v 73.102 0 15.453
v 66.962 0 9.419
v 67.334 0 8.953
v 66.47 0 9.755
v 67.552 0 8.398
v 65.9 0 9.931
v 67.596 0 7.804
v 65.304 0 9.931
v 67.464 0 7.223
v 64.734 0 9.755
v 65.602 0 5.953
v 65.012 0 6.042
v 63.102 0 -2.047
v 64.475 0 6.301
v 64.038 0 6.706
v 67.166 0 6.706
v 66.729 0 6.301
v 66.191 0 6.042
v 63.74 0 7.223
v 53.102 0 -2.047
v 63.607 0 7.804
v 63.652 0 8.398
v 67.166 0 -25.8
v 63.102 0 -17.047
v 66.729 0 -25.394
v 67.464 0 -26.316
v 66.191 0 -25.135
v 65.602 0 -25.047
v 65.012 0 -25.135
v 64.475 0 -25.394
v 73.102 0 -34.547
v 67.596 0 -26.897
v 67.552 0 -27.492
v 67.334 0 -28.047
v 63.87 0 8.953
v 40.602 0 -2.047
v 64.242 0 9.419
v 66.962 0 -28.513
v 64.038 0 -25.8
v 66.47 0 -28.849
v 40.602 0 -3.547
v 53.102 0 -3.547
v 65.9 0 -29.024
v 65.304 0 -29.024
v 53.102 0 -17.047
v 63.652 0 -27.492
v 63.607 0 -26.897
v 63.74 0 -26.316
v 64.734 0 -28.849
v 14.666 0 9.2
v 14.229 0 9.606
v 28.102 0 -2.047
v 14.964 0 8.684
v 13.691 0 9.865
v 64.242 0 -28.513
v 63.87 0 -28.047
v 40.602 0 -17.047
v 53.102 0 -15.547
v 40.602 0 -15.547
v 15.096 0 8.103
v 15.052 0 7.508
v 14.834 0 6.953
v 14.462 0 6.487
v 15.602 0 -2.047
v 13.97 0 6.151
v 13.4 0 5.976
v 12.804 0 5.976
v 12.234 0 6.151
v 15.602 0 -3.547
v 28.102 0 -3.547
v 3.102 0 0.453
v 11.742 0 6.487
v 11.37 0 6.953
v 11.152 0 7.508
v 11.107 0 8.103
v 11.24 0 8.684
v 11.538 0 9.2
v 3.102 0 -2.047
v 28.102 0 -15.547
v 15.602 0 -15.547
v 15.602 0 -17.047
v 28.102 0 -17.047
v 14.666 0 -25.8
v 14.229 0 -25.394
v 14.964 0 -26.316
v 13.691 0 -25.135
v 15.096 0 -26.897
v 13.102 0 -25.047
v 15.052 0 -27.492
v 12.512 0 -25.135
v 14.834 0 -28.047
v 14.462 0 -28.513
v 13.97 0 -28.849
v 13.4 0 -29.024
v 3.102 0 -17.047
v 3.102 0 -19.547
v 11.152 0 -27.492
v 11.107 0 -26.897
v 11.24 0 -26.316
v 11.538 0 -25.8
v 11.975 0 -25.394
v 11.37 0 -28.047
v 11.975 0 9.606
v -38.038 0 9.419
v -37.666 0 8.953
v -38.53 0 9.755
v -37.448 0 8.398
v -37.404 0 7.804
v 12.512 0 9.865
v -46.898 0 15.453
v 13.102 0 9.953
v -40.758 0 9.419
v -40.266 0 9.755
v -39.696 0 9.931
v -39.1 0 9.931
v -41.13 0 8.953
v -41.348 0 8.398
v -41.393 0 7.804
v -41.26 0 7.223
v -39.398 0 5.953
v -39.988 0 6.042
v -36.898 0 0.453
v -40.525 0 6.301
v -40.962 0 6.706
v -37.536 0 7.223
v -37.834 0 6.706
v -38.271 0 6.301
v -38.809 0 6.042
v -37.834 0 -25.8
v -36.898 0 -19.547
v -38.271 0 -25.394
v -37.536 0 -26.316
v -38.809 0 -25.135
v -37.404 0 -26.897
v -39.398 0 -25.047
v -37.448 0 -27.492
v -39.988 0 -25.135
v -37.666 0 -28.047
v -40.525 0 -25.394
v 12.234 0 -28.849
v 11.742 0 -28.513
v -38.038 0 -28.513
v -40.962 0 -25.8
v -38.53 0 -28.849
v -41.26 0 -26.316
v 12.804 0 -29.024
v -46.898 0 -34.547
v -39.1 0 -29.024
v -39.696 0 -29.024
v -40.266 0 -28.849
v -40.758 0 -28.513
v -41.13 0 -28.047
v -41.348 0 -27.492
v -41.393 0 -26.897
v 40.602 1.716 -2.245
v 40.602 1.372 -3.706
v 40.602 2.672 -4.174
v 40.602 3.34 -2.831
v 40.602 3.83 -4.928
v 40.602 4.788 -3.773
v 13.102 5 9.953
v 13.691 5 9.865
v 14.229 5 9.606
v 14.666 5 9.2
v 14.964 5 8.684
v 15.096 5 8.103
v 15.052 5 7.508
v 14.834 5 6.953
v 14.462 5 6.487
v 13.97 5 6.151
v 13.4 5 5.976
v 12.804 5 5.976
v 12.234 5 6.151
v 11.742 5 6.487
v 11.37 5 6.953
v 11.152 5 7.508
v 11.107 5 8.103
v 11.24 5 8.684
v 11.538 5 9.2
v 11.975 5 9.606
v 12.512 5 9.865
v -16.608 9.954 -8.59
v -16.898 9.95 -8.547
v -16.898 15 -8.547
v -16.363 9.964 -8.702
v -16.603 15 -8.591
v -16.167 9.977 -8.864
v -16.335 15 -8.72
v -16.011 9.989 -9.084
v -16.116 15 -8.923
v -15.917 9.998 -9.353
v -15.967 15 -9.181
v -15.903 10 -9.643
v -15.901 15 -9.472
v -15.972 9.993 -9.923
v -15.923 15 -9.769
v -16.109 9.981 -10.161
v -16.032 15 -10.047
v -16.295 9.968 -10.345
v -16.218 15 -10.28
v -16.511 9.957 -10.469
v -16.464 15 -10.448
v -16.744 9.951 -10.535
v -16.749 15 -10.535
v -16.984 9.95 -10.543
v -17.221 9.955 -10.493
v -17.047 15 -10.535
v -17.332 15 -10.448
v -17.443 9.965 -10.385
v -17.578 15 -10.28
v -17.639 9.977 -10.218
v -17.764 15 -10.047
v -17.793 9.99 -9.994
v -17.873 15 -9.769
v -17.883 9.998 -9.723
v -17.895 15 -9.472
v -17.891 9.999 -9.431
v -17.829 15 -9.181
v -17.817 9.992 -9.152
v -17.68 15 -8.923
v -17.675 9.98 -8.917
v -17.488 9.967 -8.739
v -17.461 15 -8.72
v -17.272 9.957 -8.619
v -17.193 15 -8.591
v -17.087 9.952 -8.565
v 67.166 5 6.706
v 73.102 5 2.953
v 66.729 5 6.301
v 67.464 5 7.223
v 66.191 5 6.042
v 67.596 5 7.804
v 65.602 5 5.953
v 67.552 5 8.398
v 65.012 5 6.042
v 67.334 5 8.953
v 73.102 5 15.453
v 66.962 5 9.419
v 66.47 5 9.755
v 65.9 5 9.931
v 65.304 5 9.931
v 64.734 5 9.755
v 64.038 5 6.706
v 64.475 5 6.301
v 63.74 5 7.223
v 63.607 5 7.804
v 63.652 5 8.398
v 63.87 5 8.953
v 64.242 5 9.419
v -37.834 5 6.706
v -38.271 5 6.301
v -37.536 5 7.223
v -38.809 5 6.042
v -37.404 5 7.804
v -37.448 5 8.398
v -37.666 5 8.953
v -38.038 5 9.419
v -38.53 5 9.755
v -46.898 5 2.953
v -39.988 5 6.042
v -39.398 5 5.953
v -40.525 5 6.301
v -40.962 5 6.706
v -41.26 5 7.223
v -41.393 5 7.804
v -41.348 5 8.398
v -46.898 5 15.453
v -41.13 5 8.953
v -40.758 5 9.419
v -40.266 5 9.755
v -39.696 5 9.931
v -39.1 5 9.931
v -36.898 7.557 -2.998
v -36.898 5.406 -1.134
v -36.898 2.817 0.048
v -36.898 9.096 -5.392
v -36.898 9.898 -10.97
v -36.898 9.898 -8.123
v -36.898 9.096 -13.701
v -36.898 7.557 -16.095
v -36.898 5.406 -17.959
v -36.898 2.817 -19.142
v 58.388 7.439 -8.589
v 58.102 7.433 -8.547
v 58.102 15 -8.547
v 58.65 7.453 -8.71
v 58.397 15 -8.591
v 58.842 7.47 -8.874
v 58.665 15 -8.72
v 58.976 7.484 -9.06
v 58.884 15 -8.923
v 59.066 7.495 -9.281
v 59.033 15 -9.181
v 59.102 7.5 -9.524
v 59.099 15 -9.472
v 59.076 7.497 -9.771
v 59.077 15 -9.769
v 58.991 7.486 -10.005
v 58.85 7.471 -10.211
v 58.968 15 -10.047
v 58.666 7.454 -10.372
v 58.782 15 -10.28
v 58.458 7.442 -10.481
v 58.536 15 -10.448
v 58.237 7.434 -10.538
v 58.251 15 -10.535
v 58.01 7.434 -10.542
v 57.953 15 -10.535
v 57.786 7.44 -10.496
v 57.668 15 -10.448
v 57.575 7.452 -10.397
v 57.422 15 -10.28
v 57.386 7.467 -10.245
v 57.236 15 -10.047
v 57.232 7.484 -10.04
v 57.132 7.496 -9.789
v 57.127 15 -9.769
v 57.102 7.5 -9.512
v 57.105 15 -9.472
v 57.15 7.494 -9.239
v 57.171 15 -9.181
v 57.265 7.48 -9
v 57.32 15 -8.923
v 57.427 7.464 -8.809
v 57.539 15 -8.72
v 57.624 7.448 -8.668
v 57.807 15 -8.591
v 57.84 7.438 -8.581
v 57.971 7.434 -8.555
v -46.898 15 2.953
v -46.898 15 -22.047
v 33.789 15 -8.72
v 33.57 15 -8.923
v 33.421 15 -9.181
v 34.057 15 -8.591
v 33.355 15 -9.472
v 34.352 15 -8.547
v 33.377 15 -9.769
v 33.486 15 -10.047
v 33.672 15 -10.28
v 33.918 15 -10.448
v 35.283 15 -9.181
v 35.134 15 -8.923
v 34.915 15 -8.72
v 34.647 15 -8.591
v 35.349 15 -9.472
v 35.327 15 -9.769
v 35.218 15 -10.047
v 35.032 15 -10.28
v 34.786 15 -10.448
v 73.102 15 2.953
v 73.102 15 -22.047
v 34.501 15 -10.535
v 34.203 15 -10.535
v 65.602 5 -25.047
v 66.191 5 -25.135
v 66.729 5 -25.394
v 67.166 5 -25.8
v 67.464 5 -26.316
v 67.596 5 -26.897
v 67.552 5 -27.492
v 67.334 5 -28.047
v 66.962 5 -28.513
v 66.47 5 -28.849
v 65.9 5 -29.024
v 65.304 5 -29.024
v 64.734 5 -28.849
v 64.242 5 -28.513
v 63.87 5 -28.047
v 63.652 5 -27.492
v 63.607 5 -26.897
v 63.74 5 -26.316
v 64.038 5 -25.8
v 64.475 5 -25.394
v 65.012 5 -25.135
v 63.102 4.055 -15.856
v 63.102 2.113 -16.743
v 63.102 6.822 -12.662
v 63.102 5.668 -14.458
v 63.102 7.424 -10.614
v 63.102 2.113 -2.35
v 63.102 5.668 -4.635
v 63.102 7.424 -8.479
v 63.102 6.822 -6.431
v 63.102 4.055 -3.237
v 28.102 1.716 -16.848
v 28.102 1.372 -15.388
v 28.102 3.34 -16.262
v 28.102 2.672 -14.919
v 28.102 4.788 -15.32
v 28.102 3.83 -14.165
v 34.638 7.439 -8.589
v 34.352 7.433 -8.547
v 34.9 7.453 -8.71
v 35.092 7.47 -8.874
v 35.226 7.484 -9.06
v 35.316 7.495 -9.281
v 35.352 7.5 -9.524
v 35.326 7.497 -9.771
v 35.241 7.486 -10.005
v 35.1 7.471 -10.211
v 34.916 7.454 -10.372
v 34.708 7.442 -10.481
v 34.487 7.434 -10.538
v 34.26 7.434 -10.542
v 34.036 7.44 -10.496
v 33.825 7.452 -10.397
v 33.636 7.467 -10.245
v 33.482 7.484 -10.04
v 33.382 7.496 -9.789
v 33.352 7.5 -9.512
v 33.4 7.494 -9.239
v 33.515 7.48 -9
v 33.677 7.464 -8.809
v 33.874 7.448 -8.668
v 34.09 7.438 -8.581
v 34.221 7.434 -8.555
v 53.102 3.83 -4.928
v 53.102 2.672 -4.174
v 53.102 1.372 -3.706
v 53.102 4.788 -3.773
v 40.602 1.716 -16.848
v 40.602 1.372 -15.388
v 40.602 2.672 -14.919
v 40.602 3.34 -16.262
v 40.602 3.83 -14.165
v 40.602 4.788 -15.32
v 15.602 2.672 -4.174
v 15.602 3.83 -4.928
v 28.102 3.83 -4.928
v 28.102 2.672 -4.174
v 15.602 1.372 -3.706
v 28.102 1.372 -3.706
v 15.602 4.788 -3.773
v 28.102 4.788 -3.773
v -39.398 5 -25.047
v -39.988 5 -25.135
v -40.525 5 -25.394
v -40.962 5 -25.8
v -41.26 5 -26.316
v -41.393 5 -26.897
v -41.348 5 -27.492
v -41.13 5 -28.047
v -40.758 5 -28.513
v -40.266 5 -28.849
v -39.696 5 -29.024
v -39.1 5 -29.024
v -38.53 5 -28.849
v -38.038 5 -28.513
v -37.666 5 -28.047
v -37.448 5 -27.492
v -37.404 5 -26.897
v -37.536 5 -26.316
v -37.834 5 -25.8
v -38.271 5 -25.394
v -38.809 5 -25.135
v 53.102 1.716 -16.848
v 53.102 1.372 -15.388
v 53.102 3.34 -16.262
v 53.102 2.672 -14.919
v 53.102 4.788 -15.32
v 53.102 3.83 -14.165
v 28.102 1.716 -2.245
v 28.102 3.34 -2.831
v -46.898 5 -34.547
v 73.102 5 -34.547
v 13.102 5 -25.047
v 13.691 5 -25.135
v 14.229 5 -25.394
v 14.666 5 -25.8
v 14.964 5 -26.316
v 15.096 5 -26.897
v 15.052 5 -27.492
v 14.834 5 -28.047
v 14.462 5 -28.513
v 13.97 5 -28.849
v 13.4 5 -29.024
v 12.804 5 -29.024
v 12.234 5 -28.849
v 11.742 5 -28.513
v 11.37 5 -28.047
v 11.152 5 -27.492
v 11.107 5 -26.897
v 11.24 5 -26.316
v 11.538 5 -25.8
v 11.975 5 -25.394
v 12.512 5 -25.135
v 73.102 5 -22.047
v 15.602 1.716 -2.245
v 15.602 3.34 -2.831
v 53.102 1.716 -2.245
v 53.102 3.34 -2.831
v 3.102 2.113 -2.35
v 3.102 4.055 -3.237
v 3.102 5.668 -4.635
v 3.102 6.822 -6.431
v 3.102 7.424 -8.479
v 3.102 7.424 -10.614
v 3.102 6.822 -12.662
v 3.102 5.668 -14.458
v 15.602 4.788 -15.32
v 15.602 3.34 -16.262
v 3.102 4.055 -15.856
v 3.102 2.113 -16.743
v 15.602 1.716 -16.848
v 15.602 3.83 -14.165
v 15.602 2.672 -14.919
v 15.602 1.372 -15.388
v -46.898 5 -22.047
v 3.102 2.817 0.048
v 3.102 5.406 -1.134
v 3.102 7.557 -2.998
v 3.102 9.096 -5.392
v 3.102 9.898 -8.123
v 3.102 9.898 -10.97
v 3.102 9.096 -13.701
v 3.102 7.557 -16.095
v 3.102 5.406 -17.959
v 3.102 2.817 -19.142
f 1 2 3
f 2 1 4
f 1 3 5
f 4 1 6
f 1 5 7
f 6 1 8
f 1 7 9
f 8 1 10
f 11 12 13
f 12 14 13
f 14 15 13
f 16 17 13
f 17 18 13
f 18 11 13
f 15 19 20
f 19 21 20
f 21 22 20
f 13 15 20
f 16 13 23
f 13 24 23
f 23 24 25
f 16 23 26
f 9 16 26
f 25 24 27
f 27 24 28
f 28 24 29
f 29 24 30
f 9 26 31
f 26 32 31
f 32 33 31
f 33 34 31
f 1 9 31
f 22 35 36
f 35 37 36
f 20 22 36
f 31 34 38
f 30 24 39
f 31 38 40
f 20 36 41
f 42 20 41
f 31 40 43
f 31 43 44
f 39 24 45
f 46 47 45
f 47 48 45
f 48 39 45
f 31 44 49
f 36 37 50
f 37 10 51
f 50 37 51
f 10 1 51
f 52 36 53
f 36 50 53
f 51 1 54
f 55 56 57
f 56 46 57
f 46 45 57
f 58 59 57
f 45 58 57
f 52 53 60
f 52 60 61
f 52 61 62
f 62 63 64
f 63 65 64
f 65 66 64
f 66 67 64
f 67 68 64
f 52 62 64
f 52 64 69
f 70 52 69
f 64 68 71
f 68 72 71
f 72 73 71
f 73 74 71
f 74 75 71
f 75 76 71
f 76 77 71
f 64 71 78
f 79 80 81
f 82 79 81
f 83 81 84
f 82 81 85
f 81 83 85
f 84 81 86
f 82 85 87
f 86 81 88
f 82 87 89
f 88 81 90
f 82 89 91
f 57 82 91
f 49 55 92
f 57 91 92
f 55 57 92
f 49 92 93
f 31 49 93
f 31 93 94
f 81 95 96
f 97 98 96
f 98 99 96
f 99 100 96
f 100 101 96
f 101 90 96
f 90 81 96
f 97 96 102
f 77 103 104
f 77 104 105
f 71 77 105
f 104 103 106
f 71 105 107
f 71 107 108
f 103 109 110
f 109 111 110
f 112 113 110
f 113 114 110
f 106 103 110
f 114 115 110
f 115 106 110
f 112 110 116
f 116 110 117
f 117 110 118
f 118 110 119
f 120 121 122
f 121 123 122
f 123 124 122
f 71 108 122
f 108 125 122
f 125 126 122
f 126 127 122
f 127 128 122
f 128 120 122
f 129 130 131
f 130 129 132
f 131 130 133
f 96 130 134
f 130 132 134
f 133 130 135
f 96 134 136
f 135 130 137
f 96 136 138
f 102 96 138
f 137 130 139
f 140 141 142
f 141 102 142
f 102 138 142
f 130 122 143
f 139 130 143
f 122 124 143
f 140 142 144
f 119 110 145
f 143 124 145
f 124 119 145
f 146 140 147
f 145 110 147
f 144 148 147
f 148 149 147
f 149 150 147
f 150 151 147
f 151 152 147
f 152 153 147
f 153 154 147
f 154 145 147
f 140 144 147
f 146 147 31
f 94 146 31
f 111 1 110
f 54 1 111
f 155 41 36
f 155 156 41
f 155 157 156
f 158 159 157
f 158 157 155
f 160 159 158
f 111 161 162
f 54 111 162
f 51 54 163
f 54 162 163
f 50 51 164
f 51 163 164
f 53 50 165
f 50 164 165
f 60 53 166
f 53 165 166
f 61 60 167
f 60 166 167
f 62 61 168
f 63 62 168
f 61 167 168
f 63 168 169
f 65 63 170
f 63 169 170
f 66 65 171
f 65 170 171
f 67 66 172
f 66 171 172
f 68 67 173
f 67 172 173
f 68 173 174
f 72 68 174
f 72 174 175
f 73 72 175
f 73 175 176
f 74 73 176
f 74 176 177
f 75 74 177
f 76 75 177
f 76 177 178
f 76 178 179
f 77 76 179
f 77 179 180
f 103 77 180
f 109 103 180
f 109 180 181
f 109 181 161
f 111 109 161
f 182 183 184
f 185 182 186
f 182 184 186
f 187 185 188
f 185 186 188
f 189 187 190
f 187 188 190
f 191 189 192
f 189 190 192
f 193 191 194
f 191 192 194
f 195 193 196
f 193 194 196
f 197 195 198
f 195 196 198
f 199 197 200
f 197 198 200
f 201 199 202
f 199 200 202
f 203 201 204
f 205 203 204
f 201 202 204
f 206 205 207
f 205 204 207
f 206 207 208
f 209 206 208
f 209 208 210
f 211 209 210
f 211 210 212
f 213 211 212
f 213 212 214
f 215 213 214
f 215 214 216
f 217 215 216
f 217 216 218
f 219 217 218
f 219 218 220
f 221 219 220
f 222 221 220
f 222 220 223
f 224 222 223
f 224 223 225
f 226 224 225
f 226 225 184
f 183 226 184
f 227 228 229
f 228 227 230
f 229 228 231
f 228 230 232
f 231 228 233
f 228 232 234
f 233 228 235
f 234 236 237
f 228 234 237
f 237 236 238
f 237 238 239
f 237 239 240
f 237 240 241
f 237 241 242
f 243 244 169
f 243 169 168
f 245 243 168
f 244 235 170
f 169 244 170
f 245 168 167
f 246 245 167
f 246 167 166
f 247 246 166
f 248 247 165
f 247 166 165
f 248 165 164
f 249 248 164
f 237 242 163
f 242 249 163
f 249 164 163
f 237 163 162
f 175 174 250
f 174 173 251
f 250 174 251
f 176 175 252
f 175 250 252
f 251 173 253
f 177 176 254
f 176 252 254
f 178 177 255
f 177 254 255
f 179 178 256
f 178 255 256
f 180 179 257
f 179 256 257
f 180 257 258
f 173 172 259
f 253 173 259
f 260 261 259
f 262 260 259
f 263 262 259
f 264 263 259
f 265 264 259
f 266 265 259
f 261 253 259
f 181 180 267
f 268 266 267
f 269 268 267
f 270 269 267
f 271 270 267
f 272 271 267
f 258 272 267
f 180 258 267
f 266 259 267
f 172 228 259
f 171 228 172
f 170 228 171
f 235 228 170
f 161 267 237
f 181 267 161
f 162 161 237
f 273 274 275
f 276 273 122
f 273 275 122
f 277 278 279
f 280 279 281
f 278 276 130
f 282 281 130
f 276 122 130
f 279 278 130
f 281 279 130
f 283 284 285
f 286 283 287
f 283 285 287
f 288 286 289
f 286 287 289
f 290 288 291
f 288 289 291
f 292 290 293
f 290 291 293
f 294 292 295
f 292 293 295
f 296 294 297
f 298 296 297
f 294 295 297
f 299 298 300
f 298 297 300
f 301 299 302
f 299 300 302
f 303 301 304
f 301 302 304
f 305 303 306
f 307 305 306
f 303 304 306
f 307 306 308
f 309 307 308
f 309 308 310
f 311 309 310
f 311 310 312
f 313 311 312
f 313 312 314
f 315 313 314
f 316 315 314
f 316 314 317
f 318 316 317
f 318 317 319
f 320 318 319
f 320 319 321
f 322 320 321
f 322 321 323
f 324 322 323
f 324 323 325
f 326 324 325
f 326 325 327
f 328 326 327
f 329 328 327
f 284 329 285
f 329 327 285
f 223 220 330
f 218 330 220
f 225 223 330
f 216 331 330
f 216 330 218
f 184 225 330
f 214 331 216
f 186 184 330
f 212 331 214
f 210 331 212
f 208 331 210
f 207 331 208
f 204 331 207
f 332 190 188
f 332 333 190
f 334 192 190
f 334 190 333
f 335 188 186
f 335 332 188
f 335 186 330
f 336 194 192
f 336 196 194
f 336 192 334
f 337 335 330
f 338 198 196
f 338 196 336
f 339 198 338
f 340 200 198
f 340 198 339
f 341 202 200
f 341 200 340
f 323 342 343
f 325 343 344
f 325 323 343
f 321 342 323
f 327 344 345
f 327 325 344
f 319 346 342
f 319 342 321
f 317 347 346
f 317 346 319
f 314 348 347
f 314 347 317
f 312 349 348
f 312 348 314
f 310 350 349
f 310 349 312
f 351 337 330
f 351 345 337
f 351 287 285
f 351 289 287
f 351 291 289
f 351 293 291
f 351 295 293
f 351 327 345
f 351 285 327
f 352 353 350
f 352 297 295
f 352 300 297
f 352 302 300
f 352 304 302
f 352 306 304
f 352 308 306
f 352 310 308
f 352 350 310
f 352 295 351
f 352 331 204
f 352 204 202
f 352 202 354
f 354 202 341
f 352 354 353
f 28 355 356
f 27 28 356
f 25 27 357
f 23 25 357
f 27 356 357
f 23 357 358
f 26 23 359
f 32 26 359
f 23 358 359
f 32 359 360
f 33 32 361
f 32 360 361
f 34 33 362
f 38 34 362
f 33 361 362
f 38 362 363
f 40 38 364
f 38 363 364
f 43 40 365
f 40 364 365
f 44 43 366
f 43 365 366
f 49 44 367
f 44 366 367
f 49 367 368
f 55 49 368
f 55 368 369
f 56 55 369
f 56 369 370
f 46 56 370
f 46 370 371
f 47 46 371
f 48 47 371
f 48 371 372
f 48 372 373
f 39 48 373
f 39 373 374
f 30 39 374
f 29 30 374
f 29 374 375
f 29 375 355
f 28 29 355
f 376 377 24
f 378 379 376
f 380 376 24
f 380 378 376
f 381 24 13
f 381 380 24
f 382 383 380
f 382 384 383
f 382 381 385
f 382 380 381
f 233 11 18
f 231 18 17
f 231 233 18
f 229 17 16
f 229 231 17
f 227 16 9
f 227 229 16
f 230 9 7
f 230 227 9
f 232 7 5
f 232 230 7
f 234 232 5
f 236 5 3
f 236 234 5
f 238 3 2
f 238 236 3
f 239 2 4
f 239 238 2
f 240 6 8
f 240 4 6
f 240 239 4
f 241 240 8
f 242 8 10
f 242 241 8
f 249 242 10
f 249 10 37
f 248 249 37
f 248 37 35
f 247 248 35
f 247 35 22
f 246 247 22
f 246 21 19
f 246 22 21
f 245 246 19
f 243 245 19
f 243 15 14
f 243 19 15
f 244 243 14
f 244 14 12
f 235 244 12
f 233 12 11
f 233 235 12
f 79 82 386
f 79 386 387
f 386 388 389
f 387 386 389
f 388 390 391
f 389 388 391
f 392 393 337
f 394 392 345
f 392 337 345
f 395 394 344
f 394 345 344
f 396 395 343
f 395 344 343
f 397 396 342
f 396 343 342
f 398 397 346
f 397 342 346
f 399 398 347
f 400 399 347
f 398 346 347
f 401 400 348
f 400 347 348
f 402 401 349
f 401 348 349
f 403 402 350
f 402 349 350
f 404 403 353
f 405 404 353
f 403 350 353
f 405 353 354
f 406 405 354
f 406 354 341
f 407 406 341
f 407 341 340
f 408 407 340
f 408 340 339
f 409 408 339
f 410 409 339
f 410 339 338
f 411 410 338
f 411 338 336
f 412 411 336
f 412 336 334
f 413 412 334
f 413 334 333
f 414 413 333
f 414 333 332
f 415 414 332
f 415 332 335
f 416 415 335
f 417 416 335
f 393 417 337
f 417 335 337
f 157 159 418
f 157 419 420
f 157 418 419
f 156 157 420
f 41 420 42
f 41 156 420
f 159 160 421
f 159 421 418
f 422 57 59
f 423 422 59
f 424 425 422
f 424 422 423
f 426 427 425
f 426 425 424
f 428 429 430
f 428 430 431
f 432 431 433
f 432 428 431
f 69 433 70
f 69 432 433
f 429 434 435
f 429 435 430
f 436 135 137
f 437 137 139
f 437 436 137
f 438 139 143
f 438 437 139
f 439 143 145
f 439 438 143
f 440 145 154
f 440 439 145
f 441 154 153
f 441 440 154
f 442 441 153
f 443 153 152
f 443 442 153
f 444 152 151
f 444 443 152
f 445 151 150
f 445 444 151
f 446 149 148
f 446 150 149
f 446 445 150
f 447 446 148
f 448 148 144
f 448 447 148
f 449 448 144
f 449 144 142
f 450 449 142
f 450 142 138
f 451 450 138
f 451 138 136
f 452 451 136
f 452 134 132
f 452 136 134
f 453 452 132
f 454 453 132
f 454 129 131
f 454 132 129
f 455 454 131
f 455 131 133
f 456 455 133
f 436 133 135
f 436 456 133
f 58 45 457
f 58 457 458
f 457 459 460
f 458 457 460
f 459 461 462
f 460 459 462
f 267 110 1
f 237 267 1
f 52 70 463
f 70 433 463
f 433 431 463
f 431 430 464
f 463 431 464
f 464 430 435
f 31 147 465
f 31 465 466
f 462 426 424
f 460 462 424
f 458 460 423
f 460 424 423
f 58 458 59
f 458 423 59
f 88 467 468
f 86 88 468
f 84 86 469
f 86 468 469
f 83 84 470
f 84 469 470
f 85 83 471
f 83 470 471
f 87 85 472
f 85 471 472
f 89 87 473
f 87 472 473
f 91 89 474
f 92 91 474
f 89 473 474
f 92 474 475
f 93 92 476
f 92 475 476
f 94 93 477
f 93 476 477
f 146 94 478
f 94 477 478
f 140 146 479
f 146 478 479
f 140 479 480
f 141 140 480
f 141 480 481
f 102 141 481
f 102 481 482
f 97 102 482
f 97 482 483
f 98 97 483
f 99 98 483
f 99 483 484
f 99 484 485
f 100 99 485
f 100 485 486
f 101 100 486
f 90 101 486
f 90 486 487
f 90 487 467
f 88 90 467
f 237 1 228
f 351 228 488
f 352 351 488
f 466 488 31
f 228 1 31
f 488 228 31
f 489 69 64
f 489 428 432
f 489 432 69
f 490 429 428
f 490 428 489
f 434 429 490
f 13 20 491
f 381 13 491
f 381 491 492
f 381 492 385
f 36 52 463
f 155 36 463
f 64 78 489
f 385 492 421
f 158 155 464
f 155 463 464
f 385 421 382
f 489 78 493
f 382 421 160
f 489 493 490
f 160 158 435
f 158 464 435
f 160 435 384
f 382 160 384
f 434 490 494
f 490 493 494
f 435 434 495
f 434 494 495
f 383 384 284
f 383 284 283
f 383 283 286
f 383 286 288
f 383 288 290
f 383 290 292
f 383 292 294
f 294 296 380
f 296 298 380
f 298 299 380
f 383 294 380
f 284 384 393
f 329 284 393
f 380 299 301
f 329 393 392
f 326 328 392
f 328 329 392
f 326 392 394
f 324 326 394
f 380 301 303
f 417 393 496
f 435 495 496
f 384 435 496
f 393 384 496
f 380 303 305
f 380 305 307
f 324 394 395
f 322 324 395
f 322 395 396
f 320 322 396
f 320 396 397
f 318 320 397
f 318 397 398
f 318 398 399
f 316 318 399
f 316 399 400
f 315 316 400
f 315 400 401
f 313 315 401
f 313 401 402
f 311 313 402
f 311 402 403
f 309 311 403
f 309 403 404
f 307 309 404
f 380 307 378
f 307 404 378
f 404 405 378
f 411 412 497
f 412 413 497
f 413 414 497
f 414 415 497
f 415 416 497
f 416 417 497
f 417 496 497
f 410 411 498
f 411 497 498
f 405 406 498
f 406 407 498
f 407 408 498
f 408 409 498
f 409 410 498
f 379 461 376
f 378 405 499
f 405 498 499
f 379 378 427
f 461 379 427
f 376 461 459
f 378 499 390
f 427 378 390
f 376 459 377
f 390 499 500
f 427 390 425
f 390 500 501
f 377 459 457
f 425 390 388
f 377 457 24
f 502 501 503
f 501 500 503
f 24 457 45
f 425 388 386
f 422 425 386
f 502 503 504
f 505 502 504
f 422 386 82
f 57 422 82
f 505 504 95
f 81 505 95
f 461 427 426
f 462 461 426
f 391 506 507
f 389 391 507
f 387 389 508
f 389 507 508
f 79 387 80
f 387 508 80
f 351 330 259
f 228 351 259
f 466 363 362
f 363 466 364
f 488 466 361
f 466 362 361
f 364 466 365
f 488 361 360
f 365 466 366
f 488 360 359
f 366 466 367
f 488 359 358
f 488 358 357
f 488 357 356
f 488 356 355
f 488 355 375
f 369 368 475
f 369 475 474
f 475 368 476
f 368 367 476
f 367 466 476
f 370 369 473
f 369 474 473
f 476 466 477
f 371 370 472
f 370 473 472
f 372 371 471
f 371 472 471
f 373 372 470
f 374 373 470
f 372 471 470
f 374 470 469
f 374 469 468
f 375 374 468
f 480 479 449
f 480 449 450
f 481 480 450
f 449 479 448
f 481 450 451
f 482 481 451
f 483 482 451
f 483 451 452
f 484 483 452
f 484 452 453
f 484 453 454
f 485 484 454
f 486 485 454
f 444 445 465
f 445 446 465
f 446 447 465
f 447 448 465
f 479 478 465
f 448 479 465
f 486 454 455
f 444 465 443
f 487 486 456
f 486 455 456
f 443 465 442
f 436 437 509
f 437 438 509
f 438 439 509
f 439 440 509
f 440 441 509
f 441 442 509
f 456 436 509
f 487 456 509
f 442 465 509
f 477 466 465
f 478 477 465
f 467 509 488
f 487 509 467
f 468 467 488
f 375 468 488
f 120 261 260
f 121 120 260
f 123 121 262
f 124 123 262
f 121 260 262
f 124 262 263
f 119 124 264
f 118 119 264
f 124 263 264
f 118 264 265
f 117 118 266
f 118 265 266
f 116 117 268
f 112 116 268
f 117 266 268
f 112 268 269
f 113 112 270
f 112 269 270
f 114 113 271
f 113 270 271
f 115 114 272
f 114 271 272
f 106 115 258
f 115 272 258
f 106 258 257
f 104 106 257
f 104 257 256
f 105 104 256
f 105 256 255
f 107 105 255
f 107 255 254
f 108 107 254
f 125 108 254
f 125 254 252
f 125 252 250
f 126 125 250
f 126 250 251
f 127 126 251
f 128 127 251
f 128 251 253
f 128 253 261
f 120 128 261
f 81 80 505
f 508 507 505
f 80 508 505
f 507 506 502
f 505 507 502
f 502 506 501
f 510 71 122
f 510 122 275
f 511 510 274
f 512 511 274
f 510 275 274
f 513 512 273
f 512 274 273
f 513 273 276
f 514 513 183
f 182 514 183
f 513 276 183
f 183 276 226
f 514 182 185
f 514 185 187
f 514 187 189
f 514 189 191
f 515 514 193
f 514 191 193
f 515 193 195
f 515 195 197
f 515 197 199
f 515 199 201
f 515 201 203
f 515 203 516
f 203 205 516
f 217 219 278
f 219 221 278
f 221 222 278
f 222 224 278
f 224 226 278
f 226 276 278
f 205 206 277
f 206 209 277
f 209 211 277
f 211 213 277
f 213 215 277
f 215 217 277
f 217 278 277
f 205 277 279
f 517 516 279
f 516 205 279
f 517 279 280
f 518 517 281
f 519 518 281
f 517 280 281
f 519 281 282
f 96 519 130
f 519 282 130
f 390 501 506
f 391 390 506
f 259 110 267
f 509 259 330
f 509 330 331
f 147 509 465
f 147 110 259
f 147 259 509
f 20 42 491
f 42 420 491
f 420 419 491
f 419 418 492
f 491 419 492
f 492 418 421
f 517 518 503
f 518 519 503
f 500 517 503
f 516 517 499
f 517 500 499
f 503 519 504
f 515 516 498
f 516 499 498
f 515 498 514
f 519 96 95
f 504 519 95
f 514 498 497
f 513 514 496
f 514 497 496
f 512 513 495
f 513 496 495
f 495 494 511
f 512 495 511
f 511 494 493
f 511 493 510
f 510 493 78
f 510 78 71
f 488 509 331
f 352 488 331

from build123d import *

# Parameters (mm, degrees)
SKETCH2_W                       = 120
SKETCH2_H                       = 50
BOSS_EXTRUDE1_DEPTH             = 15
AUFSATZ_LINEAR_START            = 47.5
AUFSATZ_LINEAR_AUSTRAGEN3_DEPTH = 47.5
SCHNITT_LINEAR_START            = 35
SKIZZE7_R                       = 7.5
SCHNITT_LINEAR_AUSTRAGEN2_DEPTH = 12.5
SCHNITT_LINEAR_START_2          = 10
SKIZZE7_2_R                     = 7.5
SCHNITT_LINEAR_AUSTRAGEN3_DEPTH = 10
SCHNITT_LINEAR_AUSTRAGEN4_REACH = 84.234
SKIZZE8_R                       = 1
SCHNITT_LINEAR_AUSTRAGEN5_DEPTH = 126.77149982
SKIZZE10_R                      = 2
SCHNITT_LINEAR_AUSTRAGEN7_DEPTH = 82.469960946
SPIEGELN3_COPY_1_SKETCH_R       = 2
SPIEGELN3_COPY_1_DEPTH          = 82.469960946
SKIZZE12_R                      = 2
SCHNITT_LINEAR_AUSTRAGEN8_DEPTH = 10


with BuildPart() as part:
    # Sketch2 → Boss-Extrude1 (new body)
    with BuildSketch(Plane(origin=(0, 0, 0), x_dir=(1, 0, 0), z_dir=(0, 1, 0))):
        with Locations((13.101876656, 9.54663752)):
            Rectangle(SKETCH2_W, SKETCH2_H)
    extrude(amount=BOSS_EXTRUDE1_DEPTH)

    # Sketch3 → Cut-Revolve8 (revolve, cut)
    with BuildSketch(Plane(origin=(0, 0, 0), x_dir=(1, 0, 0), z_dir=(0, 1, 0))):
        Polygon((63.101876656, 9.54663752), (63.101876656, 17.04663752), (3.101876656, 17.04663752), (3.101876656, 19.54663752), (-36.898123344, 19.54663752), (-36.898123344, 9.54663752), align=None)
    revolve(axis=Axis((74.354835368, 0, -9.54663752), (-1, 0, 0)), mode=Mode.SUBTRACT)

    # Skizze2 → Aufsatz-Linear austragen3 (add)
    with BuildSketch(Plane.ZY.offset(-63.101876656).offset(AUFSATZ_LINEAR_START)):
        with BuildLine():
            Line((-3.54663752, 0), (-2.04663752, 0))
            ThreePointArc((-2.04663752, 0), (-2.491532858, 2.544700024), (-3.773437043, 4.7875))
            Line((-3.773437043, 4.7875), (-4.928077138, 3.83))
            ThreePointArc((-4.928077138, 3.83), (-3.902553791, 2.035760019), (-3.54663752, 0))
        make_face()
    aufsatz_linear_austragen3 = extrude(amount=-AUFSATZ_LINEAR_AUSTRAGEN3_DEPTH)

    # Spiegeln1: Aufsatz-Linear austragen3 across plane
    add(aufsatz_linear_austragen3.mirror(Plane.XY.offset(-9.54663752)))

    # Skizze7 → Schnitt-Linear austragen2 (cut)
    with BuildSketch(Plane.ZY.offset(-63.101876656).offset(SCHNITT_LINEAR_START)):
        with Locations((-9.54663752, 0)):
            Circle(SKIZZE7_R)
    extrude(amount=-SCHNITT_LINEAR_AUSTRAGEN2_DEPTH, mode=Mode.SUBTRACT)

    # Skizze7<2> → Schnitt-Linear austragen3 (cut)
    with BuildSketch(Plane.ZY.offset(-63.101876656).offset(SCHNITT_LINEAR_START_2)):
        with Locations((-9.54663752, 0)):
            Circle(SKIZZE7_2_R)
    extrude(amount=-SCHNITT_LINEAR_AUSTRAGEN3_DEPTH, mode=Mode.SUBTRACT)

    # Skizze8 → Schnitt-Linear austragen4 (cut, up to next)
    with BuildSketch(Plane(origin=(0, 15, 0), x_dir=(1, 0, 0), z_dir=(0, 1, 0)), mode=Mode.PRIVATE) as schnitt_linear_austragen4_sk1:
        with Locations(Location((58.101876656, 9.54663752, 0), (0, 0, 270))):
            Circle(SKIZZE8_R)
    schnitt_linear_austragen4_tool1 = extrude(schnitt_linear_austragen4_sk1.sketch, amount=-SCHNITT_LINEAR_AUSTRAGEN4_REACH, mode=Mode.PRIVATE) & part.part
    # Skizze8 → Schnitt-Linear austragen4 (cut, up to next)
    with BuildSketch(Plane(origin=(0, 15, 0), x_dir=(1, 0, 0), z_dir=(0, 1, 0)), mode=Mode.PRIVATE) as schnitt_linear_austragen4_sk2:
        with Locations(Location((34.351876656, 9.54663752, 0), (0, 0, 270))):
            Circle(SKIZZE8_R)
    schnitt_linear_austragen4_tool2 = extrude(schnitt_linear_austragen4_sk2.sketch, amount=-SCHNITT_LINEAR_AUSTRAGEN4_REACH, mode=Mode.PRIVATE) & part.part
    # Skizze8 → Schnitt-Linear austragen4 (cut, up to next)
    with BuildSketch(Plane(origin=(0, 15, 0), x_dir=(1, 0, 0), z_dir=(0, 1, 0)), mode=Mode.PRIVATE) as schnitt_linear_austragen4_sk3:
        with Locations(Location((-16.898123344, 9.54663752, 0), (0, 0, 270))):
            Circle(SKIZZE8_R)
    schnitt_linear_austragen4_tool3 = extrude(schnitt_linear_austragen4_sk3.sketch, amount=-SCHNITT_LINEAR_AUSTRAGEN4_REACH, mode=Mode.PRIVATE) & part.part
    add(schnitt_linear_austragen4_tool1.solids().sort_by_distance((58.101877, 15, -9.546638))[0], mode=Mode.SUBTRACT)
    add(schnitt_linear_austragen4_tool2.solids().sort_by_distance((34.351877, 15, -9.546638))[0], mode=Mode.SUBTRACT)
    add(schnitt_linear_austragen4_tool3.solids().sort_by_distance((-16.898123, 15, -9.546638))[0], mode=Mode.SUBTRACT)

    # Skizze9 → Schnitt-Linear austragen5 (cut, through all)
    with BuildSketch(Plane.ZY.offset(46.898123344)):
        Polygon((-34.54663752, 5), (-22.04663752, 5), (-22.04663752, 15), (2.95336248, 15), (2.95336248, 5), (15.45336248, 5), (15.45336248, 15), (-34.54663752, 15), align=None)
    extrude(amount=-SCHNITT_LINEAR_AUSTRAGEN5_DEPTH, mode=Mode.SUBTRACT)

    # Skizze10 → Schnitt-Linear austragen7 (cut, through all)
    with BuildSketch(Plane(origin=(0, 5, 0), x_dir=(1, 0, 0), z_dir=(0, 1, 0))):
        with Locations(Location((65.601876656, 27.04663752, 0), (0, 0, 270))):
            Circle(SKIZZE10_R)
    schnitt_linear_austragen7 = extrude(amount=-SCHNITT_LINEAR_AUSTRAGEN7_DEPTH, mode=Mode.SUBTRACT)

    # Spiegeln2: Schnitt-Linear austragen7 across plane
    add(schnitt_linear_austragen7.mirror(Plane.XY.offset(-9.54663752)), mode=Mode.SUBTRACT)

    # Spiegeln3: Schnitt-Linear austragen7 across plane
    add(schnitt_linear_austragen7.mirror(Plane(origin=(13.101876656, 0, 0), x_dir=(0, 0, 1), z_dir=(1, 0, 0))), mode=Mode.SUBTRACT)

    # Spiegeln3 copy 1 sketch → Spiegeln3 copy 1 (cut, through all)
    with BuildSketch(Plane(origin=(26.203753312, 5, -19.09327504), x_dir=(-1, 0, 0), z_dir=(0, 1, 0))):
        with Locations(Location((65.601876656, 27.04663752, 0), (0, 0, 270))):
            Circle(SPIEGELN3_COPY_1_SKETCH_R)
    extrude(amount=-SPIEGELN3_COPY_1_DEPTH, mode=Mode.SUBTRACT)

    # Skizze12 → Schnitt-Linear austragen8 (cut)
    with BuildSketch(Plane(origin=(0, 5, 0), x_dir=(1, 0, 0), z_dir=(0, 1, 0))):
        with Locations(Location((13.101876656, 27.04663752, 0), (0, 0, 270))):
            Circle(SKIZZE12_R)
        with Locations(Location((13.101876656, -7.95336248, 0), (0, 0, 270))):
            Circle(SKIZZE12_R)
    extrude(amount=-SCHNITT_LINEAR_AUSTRAGEN8_DEPTH, mode=Mode.SUBTRACT)


solid = part.part
